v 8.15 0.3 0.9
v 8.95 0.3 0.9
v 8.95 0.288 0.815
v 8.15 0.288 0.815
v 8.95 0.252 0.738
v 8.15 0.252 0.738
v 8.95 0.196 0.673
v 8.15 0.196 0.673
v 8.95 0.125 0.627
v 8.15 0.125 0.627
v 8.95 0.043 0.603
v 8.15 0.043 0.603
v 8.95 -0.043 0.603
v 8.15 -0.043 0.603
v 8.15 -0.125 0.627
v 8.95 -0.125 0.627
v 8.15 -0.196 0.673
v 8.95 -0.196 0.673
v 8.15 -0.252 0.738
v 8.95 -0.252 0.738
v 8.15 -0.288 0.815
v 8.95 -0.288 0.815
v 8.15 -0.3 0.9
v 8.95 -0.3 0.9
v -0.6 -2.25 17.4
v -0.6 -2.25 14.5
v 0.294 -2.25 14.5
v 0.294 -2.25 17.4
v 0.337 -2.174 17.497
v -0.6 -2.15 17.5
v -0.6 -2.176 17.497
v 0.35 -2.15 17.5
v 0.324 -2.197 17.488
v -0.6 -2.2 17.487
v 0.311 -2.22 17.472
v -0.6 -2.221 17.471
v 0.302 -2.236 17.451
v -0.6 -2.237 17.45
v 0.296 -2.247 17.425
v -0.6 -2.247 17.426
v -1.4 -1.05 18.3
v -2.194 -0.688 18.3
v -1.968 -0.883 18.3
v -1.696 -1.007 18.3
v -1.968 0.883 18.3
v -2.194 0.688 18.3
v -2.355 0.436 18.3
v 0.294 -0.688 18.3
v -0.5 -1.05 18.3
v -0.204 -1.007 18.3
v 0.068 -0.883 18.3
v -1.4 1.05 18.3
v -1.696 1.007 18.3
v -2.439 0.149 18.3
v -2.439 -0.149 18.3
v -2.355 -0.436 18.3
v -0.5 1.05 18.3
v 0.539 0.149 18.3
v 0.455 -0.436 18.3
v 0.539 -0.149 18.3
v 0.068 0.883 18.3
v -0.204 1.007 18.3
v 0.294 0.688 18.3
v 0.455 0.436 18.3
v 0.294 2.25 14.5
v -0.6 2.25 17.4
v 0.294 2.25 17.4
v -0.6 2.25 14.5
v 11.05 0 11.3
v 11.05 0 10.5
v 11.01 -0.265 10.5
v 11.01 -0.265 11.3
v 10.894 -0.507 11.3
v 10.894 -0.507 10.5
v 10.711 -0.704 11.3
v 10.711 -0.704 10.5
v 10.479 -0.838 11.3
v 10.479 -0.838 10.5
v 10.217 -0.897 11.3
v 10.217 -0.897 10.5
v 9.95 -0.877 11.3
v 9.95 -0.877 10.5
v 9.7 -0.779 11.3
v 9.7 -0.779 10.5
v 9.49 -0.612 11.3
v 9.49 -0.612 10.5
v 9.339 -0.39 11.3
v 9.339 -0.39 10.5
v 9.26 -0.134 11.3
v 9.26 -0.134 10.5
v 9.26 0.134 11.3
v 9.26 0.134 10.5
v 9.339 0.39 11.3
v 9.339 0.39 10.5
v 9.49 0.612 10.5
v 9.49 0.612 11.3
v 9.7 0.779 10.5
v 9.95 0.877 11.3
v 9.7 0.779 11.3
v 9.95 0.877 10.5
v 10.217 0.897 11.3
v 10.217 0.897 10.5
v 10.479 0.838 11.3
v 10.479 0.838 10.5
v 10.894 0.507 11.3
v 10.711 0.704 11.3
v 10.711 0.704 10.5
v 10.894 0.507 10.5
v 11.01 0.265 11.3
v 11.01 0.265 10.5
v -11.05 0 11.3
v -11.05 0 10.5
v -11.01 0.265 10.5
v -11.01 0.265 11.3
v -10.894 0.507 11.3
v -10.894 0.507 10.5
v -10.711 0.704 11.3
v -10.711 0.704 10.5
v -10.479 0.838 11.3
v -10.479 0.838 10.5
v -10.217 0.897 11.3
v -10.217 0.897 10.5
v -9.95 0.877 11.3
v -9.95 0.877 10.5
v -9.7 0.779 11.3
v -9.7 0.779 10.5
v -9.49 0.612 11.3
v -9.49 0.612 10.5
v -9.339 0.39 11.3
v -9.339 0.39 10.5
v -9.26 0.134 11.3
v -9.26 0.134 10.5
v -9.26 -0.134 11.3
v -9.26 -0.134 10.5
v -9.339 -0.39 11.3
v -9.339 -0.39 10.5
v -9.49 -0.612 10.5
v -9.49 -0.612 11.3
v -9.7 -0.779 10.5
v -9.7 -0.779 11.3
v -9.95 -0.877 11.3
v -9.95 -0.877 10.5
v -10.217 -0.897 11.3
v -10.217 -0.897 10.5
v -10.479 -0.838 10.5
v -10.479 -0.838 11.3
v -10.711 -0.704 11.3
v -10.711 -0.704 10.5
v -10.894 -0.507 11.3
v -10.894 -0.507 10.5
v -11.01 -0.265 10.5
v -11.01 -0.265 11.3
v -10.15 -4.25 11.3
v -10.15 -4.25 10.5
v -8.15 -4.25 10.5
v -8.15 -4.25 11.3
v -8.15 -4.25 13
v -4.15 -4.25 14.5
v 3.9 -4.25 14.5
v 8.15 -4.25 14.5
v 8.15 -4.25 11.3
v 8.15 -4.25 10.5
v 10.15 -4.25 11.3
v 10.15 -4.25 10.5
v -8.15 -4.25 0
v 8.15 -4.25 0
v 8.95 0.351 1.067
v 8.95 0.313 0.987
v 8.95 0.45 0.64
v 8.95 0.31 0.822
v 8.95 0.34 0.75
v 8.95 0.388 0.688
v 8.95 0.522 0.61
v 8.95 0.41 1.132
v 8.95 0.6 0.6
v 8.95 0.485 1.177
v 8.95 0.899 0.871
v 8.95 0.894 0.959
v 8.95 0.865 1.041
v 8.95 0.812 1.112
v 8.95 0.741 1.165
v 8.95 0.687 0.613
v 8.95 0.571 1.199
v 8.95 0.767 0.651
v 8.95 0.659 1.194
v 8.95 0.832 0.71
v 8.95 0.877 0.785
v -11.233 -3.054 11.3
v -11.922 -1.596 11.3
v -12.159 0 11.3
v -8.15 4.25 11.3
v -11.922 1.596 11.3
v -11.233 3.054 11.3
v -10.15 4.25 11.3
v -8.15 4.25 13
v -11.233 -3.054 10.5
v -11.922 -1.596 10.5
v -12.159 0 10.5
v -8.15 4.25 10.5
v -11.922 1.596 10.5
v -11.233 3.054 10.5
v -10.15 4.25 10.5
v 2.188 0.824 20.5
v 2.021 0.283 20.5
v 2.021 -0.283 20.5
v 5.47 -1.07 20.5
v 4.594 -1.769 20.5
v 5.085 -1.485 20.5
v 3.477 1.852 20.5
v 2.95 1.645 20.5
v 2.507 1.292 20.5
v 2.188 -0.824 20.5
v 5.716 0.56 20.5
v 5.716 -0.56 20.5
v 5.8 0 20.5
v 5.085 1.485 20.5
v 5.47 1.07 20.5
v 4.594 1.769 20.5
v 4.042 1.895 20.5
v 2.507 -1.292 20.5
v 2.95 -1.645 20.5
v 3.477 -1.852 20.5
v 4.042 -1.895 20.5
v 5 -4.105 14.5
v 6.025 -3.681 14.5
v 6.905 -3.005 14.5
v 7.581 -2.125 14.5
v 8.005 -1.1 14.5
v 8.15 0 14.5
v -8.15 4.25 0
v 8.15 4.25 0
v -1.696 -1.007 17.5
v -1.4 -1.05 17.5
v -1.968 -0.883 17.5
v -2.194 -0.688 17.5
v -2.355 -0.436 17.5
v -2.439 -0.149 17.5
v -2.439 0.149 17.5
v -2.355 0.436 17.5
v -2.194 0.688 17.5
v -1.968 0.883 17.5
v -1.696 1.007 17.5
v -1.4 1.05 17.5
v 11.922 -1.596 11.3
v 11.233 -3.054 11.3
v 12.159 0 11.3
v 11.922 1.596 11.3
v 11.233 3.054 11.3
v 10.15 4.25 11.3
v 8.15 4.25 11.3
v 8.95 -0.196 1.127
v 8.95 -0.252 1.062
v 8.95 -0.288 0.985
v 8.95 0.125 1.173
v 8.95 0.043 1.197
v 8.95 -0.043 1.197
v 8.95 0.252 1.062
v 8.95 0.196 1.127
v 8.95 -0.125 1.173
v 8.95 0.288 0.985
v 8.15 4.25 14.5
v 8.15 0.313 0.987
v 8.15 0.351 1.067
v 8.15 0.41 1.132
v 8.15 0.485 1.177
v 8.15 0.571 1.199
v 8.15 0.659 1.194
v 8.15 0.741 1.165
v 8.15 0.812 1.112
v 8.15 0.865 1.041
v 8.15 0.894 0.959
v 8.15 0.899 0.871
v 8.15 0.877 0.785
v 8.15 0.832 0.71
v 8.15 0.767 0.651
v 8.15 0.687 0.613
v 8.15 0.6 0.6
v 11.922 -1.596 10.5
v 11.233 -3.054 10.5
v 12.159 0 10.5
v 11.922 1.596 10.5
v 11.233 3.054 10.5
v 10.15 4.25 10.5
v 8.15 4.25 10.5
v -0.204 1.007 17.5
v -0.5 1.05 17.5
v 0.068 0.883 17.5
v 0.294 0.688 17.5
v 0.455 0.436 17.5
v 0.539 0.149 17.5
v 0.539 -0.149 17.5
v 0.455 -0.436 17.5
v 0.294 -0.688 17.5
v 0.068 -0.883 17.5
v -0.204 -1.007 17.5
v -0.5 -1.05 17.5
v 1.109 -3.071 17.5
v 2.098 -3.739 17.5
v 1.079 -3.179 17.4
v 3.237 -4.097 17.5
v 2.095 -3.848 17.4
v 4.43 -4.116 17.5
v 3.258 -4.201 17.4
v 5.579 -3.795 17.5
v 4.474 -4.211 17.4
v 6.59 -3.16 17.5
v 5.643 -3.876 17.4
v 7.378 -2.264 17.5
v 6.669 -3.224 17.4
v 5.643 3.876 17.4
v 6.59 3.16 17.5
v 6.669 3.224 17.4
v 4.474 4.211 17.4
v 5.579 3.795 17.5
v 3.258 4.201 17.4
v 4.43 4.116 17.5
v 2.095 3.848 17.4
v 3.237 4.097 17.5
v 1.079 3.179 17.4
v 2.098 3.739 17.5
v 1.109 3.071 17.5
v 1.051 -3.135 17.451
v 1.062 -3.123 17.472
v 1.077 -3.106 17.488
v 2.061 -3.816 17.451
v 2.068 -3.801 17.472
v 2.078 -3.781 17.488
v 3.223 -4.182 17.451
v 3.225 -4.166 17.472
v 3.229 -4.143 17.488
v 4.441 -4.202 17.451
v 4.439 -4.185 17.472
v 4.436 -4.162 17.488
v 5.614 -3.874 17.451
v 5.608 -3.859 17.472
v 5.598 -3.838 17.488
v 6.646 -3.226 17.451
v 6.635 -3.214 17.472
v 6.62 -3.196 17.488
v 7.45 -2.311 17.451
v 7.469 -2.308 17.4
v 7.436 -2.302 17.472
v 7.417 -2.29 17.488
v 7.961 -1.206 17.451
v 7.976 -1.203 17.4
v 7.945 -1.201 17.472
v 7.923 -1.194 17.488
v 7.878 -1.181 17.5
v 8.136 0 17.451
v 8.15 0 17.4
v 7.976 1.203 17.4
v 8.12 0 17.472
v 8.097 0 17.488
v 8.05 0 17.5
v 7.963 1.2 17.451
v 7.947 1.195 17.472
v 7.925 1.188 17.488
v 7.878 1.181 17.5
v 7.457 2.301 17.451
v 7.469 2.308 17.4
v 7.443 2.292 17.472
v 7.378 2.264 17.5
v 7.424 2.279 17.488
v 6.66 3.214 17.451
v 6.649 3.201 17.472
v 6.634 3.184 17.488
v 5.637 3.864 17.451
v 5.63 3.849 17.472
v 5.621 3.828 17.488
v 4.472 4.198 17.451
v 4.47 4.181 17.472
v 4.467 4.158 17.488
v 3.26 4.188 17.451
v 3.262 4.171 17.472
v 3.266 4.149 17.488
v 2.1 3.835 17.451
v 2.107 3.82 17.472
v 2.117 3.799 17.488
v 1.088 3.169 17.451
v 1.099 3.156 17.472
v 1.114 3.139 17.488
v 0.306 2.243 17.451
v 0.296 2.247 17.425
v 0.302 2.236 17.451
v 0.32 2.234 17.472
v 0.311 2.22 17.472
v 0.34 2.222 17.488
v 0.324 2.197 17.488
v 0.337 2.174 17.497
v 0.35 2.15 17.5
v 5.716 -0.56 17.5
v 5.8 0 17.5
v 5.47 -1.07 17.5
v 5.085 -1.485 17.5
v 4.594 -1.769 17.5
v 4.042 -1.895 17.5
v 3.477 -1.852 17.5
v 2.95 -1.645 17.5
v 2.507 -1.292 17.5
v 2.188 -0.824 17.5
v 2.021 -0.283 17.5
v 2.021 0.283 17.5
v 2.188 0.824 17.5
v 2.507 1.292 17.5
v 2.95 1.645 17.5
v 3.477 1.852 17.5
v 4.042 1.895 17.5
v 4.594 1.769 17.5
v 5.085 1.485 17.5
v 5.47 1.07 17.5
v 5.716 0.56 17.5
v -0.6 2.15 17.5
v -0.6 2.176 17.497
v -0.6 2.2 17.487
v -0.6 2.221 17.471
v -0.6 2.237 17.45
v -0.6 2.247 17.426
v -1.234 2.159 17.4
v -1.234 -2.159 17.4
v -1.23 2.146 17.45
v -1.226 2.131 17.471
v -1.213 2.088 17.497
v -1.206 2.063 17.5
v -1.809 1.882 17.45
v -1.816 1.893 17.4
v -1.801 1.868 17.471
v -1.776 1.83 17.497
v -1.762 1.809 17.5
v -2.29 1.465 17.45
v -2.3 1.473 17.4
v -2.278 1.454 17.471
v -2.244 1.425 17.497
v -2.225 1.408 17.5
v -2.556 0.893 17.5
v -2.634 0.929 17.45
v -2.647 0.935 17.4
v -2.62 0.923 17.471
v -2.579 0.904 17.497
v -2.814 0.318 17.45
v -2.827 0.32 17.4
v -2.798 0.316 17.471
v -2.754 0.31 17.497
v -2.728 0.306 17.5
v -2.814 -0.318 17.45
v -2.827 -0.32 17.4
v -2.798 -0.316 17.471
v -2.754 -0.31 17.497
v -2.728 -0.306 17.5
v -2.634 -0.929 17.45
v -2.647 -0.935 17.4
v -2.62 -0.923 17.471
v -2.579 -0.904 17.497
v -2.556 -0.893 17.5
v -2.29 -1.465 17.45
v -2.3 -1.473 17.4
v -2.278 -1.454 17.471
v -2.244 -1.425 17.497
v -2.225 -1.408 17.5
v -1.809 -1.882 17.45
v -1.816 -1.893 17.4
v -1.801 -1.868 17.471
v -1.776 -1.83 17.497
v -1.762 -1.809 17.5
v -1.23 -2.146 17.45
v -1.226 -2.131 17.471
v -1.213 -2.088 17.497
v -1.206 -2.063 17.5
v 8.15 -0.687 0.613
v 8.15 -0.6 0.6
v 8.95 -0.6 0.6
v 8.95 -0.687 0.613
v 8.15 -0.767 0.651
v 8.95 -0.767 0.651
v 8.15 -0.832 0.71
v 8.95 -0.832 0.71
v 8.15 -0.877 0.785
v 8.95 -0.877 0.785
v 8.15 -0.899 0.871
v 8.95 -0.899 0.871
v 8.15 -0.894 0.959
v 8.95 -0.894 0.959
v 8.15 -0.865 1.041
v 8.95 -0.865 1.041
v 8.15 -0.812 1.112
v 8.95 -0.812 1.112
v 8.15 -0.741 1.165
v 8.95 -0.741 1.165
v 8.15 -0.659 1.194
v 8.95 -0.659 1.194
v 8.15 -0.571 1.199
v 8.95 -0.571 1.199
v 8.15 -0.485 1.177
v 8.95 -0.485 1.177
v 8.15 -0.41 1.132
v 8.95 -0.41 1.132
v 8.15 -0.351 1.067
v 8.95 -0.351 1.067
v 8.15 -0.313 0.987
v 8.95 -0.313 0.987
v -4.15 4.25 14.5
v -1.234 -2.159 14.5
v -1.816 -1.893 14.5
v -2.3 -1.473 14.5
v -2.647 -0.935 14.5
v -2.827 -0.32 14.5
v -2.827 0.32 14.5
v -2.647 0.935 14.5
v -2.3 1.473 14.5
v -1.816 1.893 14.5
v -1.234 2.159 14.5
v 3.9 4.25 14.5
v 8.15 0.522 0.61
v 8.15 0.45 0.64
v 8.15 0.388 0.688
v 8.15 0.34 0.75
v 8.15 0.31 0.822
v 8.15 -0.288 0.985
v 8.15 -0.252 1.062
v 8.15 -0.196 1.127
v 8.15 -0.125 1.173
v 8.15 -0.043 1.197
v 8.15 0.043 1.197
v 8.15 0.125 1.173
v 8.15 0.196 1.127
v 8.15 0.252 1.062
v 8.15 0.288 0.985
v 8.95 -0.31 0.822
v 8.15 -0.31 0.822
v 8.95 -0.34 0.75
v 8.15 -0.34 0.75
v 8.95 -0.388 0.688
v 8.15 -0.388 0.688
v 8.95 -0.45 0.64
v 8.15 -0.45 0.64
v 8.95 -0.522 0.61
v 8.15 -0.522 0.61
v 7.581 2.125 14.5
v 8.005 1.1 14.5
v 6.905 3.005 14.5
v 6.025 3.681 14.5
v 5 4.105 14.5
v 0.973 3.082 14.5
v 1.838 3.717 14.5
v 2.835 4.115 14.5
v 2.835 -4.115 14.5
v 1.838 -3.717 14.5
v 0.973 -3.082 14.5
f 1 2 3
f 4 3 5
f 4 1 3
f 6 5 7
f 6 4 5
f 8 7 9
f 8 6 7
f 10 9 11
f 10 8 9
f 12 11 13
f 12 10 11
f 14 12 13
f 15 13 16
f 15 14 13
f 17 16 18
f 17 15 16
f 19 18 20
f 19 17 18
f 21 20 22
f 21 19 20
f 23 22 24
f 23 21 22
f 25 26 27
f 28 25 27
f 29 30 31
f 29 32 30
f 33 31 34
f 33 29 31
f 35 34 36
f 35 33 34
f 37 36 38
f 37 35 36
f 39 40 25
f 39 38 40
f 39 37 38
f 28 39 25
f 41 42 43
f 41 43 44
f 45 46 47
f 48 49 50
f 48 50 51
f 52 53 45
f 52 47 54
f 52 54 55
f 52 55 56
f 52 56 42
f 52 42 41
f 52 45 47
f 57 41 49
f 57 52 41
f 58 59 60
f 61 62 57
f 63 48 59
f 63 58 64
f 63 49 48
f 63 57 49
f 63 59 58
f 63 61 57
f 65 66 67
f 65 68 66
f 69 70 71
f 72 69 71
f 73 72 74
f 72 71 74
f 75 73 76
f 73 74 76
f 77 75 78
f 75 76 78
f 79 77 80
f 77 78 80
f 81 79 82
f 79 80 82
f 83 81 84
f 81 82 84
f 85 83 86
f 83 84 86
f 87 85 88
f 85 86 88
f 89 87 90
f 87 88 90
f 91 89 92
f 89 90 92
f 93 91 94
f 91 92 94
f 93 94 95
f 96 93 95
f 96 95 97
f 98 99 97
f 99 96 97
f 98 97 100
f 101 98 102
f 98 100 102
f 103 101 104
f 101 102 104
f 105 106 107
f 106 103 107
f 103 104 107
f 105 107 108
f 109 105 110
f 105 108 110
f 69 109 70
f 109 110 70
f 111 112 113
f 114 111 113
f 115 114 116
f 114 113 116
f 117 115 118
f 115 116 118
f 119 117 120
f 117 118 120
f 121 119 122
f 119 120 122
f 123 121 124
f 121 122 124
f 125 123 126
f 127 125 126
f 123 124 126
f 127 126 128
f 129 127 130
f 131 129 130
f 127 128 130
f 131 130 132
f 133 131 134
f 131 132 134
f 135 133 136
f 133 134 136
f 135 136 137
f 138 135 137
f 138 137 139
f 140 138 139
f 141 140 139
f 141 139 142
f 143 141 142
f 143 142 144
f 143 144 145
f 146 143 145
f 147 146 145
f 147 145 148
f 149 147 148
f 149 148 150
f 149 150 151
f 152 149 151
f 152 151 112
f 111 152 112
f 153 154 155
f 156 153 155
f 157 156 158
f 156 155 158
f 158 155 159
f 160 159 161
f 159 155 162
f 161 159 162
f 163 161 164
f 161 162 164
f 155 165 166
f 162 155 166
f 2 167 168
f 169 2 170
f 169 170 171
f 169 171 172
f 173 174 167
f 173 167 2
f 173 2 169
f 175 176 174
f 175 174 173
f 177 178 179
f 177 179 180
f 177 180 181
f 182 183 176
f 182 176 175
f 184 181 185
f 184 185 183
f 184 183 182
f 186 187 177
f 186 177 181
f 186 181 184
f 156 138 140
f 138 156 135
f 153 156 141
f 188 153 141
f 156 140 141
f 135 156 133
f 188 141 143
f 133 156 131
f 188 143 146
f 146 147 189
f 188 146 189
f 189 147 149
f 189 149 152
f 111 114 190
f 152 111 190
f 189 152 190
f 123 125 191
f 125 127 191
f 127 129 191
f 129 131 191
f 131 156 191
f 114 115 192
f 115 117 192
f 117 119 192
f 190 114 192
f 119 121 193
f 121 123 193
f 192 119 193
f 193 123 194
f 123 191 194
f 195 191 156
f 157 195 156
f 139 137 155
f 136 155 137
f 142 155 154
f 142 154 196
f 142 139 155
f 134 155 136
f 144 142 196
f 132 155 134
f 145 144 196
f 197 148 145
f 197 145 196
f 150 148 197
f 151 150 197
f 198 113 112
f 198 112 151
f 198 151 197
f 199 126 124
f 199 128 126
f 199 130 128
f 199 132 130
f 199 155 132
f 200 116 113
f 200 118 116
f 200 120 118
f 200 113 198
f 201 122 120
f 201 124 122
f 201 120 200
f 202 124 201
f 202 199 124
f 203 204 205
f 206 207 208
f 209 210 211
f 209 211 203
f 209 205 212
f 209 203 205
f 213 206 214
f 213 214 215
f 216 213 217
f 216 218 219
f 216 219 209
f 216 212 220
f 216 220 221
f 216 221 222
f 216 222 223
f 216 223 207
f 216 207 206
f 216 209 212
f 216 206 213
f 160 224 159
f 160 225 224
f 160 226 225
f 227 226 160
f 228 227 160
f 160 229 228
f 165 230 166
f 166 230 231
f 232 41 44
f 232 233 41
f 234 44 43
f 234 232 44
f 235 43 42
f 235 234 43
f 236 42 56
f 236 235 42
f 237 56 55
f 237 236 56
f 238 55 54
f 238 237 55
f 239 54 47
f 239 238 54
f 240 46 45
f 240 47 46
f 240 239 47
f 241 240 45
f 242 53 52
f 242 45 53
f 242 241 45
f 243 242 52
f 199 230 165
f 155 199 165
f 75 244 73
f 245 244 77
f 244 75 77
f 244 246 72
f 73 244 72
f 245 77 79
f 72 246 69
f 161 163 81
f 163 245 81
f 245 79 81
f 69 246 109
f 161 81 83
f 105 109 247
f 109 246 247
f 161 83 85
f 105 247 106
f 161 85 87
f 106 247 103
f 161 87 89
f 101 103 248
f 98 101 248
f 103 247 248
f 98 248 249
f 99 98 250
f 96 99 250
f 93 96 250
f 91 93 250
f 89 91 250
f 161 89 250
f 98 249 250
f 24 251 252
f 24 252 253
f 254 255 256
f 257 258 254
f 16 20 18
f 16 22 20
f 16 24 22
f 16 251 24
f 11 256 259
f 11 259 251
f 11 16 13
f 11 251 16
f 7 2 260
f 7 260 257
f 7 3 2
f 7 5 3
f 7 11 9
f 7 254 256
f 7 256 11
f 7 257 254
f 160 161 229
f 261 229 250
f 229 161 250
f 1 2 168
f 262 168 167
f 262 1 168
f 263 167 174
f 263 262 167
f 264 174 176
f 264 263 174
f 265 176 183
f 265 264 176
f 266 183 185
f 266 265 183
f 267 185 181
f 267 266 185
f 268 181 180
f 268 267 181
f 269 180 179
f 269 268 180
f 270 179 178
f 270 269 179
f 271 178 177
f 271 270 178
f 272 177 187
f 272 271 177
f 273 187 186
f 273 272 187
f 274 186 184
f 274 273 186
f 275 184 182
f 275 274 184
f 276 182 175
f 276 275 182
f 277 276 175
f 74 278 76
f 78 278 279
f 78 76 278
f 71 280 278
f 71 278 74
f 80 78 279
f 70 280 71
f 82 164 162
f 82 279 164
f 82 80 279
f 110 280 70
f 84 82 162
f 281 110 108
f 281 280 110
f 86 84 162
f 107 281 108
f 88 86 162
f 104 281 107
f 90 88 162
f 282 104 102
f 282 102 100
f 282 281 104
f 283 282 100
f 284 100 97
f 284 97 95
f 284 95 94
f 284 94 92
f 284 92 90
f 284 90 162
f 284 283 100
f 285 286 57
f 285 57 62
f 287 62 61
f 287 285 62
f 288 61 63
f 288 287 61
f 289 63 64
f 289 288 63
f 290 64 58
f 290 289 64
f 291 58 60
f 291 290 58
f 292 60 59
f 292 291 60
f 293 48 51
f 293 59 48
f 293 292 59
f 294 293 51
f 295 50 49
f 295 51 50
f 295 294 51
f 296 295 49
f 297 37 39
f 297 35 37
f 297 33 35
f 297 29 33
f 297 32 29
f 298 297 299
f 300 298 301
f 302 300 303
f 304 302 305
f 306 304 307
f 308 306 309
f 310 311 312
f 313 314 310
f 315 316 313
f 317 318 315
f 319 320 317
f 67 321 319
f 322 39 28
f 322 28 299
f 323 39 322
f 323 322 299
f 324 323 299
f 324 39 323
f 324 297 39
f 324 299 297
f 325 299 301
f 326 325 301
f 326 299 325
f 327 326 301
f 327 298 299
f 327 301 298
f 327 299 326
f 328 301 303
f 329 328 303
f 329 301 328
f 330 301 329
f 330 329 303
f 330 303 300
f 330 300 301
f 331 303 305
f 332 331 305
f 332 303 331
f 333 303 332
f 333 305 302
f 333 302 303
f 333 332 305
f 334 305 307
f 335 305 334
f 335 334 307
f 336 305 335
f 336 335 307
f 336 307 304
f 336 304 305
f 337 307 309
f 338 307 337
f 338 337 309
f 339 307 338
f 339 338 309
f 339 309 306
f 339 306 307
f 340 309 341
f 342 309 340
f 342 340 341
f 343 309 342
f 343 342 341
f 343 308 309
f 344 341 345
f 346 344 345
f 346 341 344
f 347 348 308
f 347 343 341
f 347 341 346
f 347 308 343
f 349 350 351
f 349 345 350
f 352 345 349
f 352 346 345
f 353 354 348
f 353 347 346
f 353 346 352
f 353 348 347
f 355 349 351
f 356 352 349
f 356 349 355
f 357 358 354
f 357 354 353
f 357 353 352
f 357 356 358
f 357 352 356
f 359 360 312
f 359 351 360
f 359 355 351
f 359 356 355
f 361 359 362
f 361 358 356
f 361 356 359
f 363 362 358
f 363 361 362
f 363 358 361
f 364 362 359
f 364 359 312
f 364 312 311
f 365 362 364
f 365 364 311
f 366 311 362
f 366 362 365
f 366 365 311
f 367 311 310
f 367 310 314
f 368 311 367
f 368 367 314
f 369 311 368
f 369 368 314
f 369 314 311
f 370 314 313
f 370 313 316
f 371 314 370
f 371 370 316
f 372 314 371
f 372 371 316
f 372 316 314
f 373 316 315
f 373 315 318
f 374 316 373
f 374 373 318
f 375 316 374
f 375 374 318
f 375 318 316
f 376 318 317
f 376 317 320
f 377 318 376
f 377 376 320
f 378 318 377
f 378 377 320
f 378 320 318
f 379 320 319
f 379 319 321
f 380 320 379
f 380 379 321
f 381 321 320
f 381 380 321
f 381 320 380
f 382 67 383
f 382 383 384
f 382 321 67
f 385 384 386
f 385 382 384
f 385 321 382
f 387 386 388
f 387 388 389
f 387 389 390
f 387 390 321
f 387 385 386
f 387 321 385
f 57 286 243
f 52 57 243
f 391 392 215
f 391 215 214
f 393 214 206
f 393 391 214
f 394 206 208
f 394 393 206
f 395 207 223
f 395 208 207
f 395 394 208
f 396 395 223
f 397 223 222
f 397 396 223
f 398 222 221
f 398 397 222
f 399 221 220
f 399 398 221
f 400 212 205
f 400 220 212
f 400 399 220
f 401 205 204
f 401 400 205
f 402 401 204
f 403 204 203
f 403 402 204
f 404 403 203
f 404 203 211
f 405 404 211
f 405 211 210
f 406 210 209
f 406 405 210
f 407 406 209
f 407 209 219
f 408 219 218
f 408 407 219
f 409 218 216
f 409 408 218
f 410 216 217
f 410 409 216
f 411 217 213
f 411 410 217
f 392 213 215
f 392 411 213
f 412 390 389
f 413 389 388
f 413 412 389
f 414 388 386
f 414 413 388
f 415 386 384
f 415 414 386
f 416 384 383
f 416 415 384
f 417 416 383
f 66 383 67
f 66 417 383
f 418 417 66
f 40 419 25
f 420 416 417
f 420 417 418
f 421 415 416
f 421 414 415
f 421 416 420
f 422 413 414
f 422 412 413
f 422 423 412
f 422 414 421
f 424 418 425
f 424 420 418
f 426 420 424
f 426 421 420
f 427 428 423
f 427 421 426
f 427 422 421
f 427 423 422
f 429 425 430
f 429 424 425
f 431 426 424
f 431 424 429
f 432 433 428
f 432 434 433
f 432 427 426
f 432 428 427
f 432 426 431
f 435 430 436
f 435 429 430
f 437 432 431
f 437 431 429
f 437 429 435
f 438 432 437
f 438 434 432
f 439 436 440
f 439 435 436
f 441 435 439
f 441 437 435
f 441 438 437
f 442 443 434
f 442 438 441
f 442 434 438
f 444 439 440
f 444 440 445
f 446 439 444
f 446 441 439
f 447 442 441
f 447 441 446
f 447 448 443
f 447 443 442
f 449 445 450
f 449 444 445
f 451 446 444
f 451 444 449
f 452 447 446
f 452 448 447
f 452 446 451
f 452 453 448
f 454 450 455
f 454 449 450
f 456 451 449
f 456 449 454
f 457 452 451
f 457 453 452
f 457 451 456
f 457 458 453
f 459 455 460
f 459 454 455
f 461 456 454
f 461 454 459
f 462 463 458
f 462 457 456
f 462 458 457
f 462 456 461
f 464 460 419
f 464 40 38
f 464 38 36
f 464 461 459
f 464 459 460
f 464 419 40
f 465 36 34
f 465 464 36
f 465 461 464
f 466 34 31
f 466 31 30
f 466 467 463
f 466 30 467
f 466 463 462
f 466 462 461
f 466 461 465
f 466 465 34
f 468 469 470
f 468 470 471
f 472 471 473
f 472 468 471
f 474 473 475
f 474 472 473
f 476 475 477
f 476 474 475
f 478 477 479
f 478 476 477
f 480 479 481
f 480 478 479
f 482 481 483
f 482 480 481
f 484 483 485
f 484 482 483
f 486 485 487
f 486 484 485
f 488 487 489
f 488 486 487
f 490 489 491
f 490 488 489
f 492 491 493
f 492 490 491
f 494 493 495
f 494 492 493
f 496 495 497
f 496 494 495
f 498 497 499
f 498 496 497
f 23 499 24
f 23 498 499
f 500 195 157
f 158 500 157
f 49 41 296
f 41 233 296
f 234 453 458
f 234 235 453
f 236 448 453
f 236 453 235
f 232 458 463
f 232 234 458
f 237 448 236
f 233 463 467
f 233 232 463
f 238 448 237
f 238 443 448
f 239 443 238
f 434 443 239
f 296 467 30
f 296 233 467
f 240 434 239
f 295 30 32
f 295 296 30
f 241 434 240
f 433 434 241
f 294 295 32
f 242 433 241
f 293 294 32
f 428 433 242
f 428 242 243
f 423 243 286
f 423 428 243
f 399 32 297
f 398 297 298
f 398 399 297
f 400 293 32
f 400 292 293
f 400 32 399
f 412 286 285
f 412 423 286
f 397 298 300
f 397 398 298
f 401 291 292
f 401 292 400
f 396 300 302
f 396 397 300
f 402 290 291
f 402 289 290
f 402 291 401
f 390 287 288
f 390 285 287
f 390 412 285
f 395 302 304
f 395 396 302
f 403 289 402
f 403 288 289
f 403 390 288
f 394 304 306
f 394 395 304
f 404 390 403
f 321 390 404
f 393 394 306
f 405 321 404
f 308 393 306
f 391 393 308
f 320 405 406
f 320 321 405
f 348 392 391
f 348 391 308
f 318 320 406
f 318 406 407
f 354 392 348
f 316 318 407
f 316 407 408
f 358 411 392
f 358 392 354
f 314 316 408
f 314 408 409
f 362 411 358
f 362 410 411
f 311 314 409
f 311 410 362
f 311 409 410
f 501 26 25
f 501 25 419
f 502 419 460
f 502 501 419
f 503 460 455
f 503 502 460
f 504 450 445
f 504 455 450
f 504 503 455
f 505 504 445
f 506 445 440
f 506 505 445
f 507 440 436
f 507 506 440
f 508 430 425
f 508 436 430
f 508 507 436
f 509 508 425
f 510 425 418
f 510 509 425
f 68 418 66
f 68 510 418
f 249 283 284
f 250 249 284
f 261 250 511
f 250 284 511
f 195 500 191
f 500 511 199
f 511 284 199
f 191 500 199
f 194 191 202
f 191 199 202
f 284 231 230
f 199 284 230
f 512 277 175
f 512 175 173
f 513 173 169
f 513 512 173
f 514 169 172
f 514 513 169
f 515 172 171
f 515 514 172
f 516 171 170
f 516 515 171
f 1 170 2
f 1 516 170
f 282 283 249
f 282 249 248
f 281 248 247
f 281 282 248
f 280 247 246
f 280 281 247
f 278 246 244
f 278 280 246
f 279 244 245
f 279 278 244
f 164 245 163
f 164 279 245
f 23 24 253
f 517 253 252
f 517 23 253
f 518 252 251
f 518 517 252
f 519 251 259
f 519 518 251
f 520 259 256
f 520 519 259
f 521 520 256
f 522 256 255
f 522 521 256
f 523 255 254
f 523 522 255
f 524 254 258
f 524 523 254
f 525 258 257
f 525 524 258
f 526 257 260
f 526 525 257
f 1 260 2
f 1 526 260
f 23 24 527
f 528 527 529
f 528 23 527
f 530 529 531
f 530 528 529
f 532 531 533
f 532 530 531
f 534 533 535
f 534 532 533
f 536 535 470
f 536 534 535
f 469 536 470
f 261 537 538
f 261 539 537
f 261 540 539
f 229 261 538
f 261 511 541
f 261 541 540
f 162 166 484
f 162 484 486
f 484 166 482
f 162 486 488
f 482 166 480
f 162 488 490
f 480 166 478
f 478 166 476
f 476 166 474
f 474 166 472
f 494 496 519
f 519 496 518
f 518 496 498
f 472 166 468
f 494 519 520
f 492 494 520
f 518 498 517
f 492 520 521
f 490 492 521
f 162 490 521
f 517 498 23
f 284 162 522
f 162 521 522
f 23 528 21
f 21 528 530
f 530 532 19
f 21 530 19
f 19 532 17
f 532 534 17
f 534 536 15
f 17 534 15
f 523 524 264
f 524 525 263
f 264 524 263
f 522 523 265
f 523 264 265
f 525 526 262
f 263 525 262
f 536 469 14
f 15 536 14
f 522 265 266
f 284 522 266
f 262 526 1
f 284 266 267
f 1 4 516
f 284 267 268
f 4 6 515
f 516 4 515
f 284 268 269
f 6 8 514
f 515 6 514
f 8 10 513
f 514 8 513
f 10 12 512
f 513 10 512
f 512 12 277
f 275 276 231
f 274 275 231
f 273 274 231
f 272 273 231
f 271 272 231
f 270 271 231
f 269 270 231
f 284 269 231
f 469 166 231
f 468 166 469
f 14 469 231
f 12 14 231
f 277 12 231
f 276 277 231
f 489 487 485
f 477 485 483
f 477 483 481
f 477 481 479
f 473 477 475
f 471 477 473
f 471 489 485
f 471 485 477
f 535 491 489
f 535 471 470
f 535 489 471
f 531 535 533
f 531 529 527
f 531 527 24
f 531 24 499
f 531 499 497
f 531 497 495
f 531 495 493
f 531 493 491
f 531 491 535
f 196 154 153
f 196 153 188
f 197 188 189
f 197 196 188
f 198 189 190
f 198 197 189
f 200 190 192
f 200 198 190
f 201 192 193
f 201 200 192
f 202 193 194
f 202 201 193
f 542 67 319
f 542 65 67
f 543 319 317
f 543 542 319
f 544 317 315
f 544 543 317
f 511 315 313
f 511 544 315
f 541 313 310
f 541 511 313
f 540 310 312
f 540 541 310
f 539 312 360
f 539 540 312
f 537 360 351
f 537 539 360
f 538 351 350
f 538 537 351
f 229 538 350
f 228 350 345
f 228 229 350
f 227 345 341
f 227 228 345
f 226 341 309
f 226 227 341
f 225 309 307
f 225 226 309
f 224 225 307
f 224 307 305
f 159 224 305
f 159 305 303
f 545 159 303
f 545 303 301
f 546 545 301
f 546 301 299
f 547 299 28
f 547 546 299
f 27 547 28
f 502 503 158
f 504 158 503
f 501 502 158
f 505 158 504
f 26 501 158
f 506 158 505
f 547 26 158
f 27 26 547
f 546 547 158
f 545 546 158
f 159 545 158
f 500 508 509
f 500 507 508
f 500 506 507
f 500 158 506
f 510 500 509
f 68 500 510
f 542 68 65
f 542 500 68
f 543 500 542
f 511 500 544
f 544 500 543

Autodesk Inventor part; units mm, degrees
ref_plane "YZ Plane" through (0, 0, 0) normal (1, 0, 0) x (0, 1, 0)
ref_plane "XZ Plane" through (0, 0, 0) normal (0, 1, 0) x (-1, 0, 0)
ref_plane "XY Plane" through (0, 0, 0) normal (0, 0, 1) x (1, 0, 0)
sketch "スケッチ1" plane through (0, 0, 0) normal (0, 0, 1) x (1, 0, 0)
  line L0 (-8.15, -4.25) -> (8.15, -4.25)
  line L1 (8.15, -4.25) -> (8.15, 4.25)
  line L2 (8.15, 4.25) -> (-8.15, 4.25)
  line L3 (-8.15, 4.25) -> (-8.15, -4.25)
  line L4 (-8.15, -4.25) -> (8.15, 4.25) construction
  line L5 (8.15, -4.25) -> (-8.15, 4.25) construction
  point P0 (0, 0)
  dimension "d0" = 16.3
  dimension "d1" = 8.5
extrude "押し出し1" add sketch "スケッチ1" along normal blind 14.5
ref_plane "作業平面2" through (0, 0, 10.5) normal (0, 0, -1) x (-1, 0, 0)
sketch "スケッチ3" plane through (0, 0, 10.5) normal (0, 0, -1) x (-1, 0, 0)
  circle A0 centre (10.15, 0) radius 0.9
  line L0 (8.15, 4.25) -> (8.15, -4.25) projected
  line L1 (8.15, -4.25) -> (8.15, 4.25)
  line L2 (8.15, 4.25) -> (10.15, 4.25)
  line L3 (8.15, -4.25) -> (10.15, -4.25)
  line L4 (8.15, 4.25) -> (8.15, -4.25) projected
  arc A1 (10.15, -4.25) -> (10.15, 4.25) centre (6.6589, 0) ccw
  point P0 (0, 0)
  point P1 (8.15, 0)
  dimension "d11" = 1.8
  dimension "d12" = 2
  dimension "d13" = 5.5
extrude "押し出し3" add sketch "スケッチ3" against normal blind 0.8
mirror "ミラー1" about plane through (0, 0, 0) normal (1, 0, 0) of "押し出し3"
sketch "スケッチ4" plane through (8.15, -4.25, 0) normal (1, 0, 0) x (0, 0, -1)
  circle A0 centre (-0.9, 4.25) radius 0.3
  circle A1 centre (-0.9, 4.85) radius 0.3
  circle A2 centre (-0.9, 3.65) radius 0.3
  line L0 (0, 0) -> (0, 8.5) projected
  point P0 (0, 4.25)
  point P1 (0, 4.25)
  dimension "d16" = 0.6
  dimension "d18" = 0.9
extrude "押し出し4" add sketch "スケッチ4" along normal blind 0.8
chamfer "面取り1" distance 4 distance2 1.5 1 edges at (-8.15, 0, 14.5) measured on face at (2.7167, -1.4167, 14.5)
sketch "スケッチ5" plane through (0, 0, 10.5) normal (0, 0, -1) x (-1, 0, 0)
  point P0 (0, 0)
sketch "スケッチ6" plane through (0, 0, 14.5) normal (0, 0, 1) x (1, 0, 0)
  arc A0 (0.2944, -2.25) -> (0.2944, 2.25) centre (3.9, 0) ccw
  line L0 (8.15, 4.25) -> (-4.15, 4.25) projected
  line L1 (8.15, -4.25) -> (8.15, 4.25) projected
  line L2 (-4.15, -4.25) -> (8.15, -4.25) projected
  arc A1 (-0.6, 2.25) -> (-0.6, -2.25) centre (-0.6, 0) ccw
  line L3 (-0.6, 2.25) -> (0.2944, 2.25)
  line L4 (-0.6, -2.25) -> (0.2944, -2.25)
  point P0 (0, 0)
  dimension "d24" = 4.5
  dimension "d25" = 4.5
extrude "押し出し5" add sketch "スケッチ6" along normal blind 3 contours L4 A1 L3 A0
sketch "スケッチ7" plane through (0, 0, 17.5) normal (0, 0, 1) x (1, 0, 0)
  arc A0 (8.15, 0) -> (3.9, 4.25) centre (3.9, 0) ccw projected
  circle A1 centre (3.9, 0) radius 1.9
  point P0 (0, 0)
  dimension "d28" = 3.8
extrude "押し出し6" add sketch "スケッチ7" along normal blind 3
sketch "スケッチ8" plane through (0, 0, 17.5) normal (0, 0, 1) x (1, 0, 0)
  line L0 (-1.4, 0) -> (-0.5, 0) construction
  line L1 (-1.4, -1.05) -> (-0.5, -1.05)
  line L2 (-0.5, 1.05) -> (-1.4, 1.05)
  arc A0 (-1.4, 1.05) -> (-1.4, -1.05) centre (-1.4, 0) ccw
  arc A1 (-0.5, -1.05) -> (-0.5, 1.05) centre (-0.5, 0) ccw
  arc A2 (-0.6, 2.25) -> (-0.6, -2.25) centre (-0.6, 0) ccw projected
  point P0 (0, 0)
  point P1 (-0.95, 0)
  dimension "d31" = 2.1
  dimension "d32" = 3
  dimension "d33" = 0.8
extrude "押し出し7" add sketch "スケッチ8" along normal blind 0.8
fillet "フィレット1" radius 0.1 4 edges at (8.15, 0, 17.5) (-2.85, 0, 17.5) (-0.1528, 2.25, 17.5) (-0.1528, -2.25, 17.5)
properties part number "Servo"
